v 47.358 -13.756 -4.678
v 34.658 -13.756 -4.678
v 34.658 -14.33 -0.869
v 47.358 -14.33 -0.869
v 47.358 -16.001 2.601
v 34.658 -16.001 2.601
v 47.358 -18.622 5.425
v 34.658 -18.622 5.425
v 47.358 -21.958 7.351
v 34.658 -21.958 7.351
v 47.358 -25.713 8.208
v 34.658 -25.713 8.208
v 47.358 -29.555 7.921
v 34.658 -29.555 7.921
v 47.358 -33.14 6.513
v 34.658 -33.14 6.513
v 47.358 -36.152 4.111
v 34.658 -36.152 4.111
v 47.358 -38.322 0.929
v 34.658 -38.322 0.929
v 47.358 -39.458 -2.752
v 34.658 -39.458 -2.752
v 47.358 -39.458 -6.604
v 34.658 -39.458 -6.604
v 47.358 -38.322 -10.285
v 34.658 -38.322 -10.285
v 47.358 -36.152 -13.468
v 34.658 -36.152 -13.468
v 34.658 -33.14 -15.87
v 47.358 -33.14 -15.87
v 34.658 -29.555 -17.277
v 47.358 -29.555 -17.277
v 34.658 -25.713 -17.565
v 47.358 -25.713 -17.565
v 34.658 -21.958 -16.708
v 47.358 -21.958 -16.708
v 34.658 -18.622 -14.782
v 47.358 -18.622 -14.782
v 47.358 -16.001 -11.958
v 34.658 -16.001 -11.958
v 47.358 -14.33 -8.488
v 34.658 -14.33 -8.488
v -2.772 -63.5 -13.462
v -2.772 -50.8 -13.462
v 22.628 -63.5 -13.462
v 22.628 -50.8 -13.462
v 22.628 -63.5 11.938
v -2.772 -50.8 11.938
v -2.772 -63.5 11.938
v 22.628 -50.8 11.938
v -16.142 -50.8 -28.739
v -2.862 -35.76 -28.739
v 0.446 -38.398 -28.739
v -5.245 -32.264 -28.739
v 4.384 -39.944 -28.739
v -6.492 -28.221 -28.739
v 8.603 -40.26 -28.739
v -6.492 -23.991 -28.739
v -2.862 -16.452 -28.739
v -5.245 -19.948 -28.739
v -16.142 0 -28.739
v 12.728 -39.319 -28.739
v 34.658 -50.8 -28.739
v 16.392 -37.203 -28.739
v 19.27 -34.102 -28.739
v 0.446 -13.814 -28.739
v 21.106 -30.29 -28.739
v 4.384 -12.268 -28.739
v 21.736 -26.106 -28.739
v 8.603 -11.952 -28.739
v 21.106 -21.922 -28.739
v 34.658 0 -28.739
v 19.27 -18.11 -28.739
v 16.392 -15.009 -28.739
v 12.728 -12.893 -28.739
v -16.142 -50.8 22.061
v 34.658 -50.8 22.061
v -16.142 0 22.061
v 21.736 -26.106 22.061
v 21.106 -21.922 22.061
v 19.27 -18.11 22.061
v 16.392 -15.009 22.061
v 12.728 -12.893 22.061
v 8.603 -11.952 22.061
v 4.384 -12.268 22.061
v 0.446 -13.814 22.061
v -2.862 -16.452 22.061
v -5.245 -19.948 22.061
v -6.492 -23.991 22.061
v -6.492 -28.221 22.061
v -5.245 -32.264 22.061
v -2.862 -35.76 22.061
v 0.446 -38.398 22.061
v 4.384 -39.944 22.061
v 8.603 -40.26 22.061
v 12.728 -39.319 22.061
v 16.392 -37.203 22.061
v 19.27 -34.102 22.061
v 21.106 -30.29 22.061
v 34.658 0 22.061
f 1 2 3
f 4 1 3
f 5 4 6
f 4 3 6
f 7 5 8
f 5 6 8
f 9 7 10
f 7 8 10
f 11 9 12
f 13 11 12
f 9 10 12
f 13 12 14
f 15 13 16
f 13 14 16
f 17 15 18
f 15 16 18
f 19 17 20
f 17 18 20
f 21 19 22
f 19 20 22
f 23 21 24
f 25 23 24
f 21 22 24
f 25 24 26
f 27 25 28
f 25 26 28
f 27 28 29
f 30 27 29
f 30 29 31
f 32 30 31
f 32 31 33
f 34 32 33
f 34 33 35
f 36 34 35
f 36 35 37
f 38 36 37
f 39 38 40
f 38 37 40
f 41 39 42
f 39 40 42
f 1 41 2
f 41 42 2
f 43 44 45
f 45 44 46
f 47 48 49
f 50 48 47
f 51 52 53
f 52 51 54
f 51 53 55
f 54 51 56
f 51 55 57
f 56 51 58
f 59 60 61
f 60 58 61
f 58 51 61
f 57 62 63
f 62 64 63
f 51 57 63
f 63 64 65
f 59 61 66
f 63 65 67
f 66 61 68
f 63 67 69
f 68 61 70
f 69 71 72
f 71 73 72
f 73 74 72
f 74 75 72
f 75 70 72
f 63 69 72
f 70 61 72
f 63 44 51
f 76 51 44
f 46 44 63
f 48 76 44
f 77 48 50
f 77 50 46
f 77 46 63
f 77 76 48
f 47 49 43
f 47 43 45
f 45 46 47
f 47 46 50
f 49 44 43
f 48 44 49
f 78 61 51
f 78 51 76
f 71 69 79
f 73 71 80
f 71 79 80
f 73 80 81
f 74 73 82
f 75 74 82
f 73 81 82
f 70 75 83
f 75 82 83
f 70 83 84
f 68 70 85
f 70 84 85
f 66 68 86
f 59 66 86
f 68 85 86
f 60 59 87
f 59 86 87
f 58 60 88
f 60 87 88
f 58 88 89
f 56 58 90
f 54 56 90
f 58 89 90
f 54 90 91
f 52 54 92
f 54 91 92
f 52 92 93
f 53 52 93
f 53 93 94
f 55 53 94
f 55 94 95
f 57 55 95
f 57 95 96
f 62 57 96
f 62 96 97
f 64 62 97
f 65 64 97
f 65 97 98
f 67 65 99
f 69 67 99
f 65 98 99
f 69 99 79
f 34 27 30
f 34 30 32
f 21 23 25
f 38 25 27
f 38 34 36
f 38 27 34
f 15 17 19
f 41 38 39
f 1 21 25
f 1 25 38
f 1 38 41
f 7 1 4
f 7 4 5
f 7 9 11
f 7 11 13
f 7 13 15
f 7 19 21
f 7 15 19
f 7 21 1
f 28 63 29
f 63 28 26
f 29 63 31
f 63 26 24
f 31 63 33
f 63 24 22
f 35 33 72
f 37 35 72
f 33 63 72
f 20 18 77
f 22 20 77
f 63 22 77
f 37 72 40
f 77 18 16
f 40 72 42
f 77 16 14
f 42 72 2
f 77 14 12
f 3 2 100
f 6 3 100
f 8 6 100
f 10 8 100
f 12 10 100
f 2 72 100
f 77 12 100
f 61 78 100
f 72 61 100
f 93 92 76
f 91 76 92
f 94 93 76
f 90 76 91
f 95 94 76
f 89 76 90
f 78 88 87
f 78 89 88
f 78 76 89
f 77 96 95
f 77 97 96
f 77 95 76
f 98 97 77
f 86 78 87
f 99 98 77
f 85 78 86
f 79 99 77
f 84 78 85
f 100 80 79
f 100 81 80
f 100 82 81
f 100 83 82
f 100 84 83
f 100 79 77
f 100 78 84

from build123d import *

# Parameters (mm, degrees)
F0_W     = 50.8
F0_H     = 50.8
F1_DEPTH = 50.8
F2_W     = 25.4
F2_H     = 25.4
F3_DEPTH = 12.7
F4_R     = 12.922989
F5_DEPTH = 12.7
F6_R     = 14.193725
F7_DEPTH = 50.8


with BuildPart() as f1:
    # F0 (on Front) → F1 (new body)
    with BuildSketch(Plane.XZ):
        with Locations((9.258268, -3.338678)):
            Rectangle(F0_W, F0_H)
    extrude(amount=F1_DEPTH)

    # F2 (on face) → F3 (join)
    with BuildSketch(Plane.XZ.offset(50.8)):
        with Locations((9.928127, -0.762303)):
            Rectangle(F2_W, F2_H)
    extrude(amount=F3_DEPTH)

    # F4 (on face) → F5 (join)
    with BuildSketch(Plane.YZ.offset(34.658268)):
        with Locations((-26.678886, -4.678389)):
            Circle(F4_R)
    extrude(amount=F5_DEPTH)

    # F6 (on face) → F7 (cut)
    with BuildSketch(Plane.XY.offset(22.061322)):
        with Locations((7.542709, -26.106022)):
            Circle(F6_R)
    extrude(amount=-F7_DEPTH, mode=Mode.SUBTRACT)


solid = f1.part
